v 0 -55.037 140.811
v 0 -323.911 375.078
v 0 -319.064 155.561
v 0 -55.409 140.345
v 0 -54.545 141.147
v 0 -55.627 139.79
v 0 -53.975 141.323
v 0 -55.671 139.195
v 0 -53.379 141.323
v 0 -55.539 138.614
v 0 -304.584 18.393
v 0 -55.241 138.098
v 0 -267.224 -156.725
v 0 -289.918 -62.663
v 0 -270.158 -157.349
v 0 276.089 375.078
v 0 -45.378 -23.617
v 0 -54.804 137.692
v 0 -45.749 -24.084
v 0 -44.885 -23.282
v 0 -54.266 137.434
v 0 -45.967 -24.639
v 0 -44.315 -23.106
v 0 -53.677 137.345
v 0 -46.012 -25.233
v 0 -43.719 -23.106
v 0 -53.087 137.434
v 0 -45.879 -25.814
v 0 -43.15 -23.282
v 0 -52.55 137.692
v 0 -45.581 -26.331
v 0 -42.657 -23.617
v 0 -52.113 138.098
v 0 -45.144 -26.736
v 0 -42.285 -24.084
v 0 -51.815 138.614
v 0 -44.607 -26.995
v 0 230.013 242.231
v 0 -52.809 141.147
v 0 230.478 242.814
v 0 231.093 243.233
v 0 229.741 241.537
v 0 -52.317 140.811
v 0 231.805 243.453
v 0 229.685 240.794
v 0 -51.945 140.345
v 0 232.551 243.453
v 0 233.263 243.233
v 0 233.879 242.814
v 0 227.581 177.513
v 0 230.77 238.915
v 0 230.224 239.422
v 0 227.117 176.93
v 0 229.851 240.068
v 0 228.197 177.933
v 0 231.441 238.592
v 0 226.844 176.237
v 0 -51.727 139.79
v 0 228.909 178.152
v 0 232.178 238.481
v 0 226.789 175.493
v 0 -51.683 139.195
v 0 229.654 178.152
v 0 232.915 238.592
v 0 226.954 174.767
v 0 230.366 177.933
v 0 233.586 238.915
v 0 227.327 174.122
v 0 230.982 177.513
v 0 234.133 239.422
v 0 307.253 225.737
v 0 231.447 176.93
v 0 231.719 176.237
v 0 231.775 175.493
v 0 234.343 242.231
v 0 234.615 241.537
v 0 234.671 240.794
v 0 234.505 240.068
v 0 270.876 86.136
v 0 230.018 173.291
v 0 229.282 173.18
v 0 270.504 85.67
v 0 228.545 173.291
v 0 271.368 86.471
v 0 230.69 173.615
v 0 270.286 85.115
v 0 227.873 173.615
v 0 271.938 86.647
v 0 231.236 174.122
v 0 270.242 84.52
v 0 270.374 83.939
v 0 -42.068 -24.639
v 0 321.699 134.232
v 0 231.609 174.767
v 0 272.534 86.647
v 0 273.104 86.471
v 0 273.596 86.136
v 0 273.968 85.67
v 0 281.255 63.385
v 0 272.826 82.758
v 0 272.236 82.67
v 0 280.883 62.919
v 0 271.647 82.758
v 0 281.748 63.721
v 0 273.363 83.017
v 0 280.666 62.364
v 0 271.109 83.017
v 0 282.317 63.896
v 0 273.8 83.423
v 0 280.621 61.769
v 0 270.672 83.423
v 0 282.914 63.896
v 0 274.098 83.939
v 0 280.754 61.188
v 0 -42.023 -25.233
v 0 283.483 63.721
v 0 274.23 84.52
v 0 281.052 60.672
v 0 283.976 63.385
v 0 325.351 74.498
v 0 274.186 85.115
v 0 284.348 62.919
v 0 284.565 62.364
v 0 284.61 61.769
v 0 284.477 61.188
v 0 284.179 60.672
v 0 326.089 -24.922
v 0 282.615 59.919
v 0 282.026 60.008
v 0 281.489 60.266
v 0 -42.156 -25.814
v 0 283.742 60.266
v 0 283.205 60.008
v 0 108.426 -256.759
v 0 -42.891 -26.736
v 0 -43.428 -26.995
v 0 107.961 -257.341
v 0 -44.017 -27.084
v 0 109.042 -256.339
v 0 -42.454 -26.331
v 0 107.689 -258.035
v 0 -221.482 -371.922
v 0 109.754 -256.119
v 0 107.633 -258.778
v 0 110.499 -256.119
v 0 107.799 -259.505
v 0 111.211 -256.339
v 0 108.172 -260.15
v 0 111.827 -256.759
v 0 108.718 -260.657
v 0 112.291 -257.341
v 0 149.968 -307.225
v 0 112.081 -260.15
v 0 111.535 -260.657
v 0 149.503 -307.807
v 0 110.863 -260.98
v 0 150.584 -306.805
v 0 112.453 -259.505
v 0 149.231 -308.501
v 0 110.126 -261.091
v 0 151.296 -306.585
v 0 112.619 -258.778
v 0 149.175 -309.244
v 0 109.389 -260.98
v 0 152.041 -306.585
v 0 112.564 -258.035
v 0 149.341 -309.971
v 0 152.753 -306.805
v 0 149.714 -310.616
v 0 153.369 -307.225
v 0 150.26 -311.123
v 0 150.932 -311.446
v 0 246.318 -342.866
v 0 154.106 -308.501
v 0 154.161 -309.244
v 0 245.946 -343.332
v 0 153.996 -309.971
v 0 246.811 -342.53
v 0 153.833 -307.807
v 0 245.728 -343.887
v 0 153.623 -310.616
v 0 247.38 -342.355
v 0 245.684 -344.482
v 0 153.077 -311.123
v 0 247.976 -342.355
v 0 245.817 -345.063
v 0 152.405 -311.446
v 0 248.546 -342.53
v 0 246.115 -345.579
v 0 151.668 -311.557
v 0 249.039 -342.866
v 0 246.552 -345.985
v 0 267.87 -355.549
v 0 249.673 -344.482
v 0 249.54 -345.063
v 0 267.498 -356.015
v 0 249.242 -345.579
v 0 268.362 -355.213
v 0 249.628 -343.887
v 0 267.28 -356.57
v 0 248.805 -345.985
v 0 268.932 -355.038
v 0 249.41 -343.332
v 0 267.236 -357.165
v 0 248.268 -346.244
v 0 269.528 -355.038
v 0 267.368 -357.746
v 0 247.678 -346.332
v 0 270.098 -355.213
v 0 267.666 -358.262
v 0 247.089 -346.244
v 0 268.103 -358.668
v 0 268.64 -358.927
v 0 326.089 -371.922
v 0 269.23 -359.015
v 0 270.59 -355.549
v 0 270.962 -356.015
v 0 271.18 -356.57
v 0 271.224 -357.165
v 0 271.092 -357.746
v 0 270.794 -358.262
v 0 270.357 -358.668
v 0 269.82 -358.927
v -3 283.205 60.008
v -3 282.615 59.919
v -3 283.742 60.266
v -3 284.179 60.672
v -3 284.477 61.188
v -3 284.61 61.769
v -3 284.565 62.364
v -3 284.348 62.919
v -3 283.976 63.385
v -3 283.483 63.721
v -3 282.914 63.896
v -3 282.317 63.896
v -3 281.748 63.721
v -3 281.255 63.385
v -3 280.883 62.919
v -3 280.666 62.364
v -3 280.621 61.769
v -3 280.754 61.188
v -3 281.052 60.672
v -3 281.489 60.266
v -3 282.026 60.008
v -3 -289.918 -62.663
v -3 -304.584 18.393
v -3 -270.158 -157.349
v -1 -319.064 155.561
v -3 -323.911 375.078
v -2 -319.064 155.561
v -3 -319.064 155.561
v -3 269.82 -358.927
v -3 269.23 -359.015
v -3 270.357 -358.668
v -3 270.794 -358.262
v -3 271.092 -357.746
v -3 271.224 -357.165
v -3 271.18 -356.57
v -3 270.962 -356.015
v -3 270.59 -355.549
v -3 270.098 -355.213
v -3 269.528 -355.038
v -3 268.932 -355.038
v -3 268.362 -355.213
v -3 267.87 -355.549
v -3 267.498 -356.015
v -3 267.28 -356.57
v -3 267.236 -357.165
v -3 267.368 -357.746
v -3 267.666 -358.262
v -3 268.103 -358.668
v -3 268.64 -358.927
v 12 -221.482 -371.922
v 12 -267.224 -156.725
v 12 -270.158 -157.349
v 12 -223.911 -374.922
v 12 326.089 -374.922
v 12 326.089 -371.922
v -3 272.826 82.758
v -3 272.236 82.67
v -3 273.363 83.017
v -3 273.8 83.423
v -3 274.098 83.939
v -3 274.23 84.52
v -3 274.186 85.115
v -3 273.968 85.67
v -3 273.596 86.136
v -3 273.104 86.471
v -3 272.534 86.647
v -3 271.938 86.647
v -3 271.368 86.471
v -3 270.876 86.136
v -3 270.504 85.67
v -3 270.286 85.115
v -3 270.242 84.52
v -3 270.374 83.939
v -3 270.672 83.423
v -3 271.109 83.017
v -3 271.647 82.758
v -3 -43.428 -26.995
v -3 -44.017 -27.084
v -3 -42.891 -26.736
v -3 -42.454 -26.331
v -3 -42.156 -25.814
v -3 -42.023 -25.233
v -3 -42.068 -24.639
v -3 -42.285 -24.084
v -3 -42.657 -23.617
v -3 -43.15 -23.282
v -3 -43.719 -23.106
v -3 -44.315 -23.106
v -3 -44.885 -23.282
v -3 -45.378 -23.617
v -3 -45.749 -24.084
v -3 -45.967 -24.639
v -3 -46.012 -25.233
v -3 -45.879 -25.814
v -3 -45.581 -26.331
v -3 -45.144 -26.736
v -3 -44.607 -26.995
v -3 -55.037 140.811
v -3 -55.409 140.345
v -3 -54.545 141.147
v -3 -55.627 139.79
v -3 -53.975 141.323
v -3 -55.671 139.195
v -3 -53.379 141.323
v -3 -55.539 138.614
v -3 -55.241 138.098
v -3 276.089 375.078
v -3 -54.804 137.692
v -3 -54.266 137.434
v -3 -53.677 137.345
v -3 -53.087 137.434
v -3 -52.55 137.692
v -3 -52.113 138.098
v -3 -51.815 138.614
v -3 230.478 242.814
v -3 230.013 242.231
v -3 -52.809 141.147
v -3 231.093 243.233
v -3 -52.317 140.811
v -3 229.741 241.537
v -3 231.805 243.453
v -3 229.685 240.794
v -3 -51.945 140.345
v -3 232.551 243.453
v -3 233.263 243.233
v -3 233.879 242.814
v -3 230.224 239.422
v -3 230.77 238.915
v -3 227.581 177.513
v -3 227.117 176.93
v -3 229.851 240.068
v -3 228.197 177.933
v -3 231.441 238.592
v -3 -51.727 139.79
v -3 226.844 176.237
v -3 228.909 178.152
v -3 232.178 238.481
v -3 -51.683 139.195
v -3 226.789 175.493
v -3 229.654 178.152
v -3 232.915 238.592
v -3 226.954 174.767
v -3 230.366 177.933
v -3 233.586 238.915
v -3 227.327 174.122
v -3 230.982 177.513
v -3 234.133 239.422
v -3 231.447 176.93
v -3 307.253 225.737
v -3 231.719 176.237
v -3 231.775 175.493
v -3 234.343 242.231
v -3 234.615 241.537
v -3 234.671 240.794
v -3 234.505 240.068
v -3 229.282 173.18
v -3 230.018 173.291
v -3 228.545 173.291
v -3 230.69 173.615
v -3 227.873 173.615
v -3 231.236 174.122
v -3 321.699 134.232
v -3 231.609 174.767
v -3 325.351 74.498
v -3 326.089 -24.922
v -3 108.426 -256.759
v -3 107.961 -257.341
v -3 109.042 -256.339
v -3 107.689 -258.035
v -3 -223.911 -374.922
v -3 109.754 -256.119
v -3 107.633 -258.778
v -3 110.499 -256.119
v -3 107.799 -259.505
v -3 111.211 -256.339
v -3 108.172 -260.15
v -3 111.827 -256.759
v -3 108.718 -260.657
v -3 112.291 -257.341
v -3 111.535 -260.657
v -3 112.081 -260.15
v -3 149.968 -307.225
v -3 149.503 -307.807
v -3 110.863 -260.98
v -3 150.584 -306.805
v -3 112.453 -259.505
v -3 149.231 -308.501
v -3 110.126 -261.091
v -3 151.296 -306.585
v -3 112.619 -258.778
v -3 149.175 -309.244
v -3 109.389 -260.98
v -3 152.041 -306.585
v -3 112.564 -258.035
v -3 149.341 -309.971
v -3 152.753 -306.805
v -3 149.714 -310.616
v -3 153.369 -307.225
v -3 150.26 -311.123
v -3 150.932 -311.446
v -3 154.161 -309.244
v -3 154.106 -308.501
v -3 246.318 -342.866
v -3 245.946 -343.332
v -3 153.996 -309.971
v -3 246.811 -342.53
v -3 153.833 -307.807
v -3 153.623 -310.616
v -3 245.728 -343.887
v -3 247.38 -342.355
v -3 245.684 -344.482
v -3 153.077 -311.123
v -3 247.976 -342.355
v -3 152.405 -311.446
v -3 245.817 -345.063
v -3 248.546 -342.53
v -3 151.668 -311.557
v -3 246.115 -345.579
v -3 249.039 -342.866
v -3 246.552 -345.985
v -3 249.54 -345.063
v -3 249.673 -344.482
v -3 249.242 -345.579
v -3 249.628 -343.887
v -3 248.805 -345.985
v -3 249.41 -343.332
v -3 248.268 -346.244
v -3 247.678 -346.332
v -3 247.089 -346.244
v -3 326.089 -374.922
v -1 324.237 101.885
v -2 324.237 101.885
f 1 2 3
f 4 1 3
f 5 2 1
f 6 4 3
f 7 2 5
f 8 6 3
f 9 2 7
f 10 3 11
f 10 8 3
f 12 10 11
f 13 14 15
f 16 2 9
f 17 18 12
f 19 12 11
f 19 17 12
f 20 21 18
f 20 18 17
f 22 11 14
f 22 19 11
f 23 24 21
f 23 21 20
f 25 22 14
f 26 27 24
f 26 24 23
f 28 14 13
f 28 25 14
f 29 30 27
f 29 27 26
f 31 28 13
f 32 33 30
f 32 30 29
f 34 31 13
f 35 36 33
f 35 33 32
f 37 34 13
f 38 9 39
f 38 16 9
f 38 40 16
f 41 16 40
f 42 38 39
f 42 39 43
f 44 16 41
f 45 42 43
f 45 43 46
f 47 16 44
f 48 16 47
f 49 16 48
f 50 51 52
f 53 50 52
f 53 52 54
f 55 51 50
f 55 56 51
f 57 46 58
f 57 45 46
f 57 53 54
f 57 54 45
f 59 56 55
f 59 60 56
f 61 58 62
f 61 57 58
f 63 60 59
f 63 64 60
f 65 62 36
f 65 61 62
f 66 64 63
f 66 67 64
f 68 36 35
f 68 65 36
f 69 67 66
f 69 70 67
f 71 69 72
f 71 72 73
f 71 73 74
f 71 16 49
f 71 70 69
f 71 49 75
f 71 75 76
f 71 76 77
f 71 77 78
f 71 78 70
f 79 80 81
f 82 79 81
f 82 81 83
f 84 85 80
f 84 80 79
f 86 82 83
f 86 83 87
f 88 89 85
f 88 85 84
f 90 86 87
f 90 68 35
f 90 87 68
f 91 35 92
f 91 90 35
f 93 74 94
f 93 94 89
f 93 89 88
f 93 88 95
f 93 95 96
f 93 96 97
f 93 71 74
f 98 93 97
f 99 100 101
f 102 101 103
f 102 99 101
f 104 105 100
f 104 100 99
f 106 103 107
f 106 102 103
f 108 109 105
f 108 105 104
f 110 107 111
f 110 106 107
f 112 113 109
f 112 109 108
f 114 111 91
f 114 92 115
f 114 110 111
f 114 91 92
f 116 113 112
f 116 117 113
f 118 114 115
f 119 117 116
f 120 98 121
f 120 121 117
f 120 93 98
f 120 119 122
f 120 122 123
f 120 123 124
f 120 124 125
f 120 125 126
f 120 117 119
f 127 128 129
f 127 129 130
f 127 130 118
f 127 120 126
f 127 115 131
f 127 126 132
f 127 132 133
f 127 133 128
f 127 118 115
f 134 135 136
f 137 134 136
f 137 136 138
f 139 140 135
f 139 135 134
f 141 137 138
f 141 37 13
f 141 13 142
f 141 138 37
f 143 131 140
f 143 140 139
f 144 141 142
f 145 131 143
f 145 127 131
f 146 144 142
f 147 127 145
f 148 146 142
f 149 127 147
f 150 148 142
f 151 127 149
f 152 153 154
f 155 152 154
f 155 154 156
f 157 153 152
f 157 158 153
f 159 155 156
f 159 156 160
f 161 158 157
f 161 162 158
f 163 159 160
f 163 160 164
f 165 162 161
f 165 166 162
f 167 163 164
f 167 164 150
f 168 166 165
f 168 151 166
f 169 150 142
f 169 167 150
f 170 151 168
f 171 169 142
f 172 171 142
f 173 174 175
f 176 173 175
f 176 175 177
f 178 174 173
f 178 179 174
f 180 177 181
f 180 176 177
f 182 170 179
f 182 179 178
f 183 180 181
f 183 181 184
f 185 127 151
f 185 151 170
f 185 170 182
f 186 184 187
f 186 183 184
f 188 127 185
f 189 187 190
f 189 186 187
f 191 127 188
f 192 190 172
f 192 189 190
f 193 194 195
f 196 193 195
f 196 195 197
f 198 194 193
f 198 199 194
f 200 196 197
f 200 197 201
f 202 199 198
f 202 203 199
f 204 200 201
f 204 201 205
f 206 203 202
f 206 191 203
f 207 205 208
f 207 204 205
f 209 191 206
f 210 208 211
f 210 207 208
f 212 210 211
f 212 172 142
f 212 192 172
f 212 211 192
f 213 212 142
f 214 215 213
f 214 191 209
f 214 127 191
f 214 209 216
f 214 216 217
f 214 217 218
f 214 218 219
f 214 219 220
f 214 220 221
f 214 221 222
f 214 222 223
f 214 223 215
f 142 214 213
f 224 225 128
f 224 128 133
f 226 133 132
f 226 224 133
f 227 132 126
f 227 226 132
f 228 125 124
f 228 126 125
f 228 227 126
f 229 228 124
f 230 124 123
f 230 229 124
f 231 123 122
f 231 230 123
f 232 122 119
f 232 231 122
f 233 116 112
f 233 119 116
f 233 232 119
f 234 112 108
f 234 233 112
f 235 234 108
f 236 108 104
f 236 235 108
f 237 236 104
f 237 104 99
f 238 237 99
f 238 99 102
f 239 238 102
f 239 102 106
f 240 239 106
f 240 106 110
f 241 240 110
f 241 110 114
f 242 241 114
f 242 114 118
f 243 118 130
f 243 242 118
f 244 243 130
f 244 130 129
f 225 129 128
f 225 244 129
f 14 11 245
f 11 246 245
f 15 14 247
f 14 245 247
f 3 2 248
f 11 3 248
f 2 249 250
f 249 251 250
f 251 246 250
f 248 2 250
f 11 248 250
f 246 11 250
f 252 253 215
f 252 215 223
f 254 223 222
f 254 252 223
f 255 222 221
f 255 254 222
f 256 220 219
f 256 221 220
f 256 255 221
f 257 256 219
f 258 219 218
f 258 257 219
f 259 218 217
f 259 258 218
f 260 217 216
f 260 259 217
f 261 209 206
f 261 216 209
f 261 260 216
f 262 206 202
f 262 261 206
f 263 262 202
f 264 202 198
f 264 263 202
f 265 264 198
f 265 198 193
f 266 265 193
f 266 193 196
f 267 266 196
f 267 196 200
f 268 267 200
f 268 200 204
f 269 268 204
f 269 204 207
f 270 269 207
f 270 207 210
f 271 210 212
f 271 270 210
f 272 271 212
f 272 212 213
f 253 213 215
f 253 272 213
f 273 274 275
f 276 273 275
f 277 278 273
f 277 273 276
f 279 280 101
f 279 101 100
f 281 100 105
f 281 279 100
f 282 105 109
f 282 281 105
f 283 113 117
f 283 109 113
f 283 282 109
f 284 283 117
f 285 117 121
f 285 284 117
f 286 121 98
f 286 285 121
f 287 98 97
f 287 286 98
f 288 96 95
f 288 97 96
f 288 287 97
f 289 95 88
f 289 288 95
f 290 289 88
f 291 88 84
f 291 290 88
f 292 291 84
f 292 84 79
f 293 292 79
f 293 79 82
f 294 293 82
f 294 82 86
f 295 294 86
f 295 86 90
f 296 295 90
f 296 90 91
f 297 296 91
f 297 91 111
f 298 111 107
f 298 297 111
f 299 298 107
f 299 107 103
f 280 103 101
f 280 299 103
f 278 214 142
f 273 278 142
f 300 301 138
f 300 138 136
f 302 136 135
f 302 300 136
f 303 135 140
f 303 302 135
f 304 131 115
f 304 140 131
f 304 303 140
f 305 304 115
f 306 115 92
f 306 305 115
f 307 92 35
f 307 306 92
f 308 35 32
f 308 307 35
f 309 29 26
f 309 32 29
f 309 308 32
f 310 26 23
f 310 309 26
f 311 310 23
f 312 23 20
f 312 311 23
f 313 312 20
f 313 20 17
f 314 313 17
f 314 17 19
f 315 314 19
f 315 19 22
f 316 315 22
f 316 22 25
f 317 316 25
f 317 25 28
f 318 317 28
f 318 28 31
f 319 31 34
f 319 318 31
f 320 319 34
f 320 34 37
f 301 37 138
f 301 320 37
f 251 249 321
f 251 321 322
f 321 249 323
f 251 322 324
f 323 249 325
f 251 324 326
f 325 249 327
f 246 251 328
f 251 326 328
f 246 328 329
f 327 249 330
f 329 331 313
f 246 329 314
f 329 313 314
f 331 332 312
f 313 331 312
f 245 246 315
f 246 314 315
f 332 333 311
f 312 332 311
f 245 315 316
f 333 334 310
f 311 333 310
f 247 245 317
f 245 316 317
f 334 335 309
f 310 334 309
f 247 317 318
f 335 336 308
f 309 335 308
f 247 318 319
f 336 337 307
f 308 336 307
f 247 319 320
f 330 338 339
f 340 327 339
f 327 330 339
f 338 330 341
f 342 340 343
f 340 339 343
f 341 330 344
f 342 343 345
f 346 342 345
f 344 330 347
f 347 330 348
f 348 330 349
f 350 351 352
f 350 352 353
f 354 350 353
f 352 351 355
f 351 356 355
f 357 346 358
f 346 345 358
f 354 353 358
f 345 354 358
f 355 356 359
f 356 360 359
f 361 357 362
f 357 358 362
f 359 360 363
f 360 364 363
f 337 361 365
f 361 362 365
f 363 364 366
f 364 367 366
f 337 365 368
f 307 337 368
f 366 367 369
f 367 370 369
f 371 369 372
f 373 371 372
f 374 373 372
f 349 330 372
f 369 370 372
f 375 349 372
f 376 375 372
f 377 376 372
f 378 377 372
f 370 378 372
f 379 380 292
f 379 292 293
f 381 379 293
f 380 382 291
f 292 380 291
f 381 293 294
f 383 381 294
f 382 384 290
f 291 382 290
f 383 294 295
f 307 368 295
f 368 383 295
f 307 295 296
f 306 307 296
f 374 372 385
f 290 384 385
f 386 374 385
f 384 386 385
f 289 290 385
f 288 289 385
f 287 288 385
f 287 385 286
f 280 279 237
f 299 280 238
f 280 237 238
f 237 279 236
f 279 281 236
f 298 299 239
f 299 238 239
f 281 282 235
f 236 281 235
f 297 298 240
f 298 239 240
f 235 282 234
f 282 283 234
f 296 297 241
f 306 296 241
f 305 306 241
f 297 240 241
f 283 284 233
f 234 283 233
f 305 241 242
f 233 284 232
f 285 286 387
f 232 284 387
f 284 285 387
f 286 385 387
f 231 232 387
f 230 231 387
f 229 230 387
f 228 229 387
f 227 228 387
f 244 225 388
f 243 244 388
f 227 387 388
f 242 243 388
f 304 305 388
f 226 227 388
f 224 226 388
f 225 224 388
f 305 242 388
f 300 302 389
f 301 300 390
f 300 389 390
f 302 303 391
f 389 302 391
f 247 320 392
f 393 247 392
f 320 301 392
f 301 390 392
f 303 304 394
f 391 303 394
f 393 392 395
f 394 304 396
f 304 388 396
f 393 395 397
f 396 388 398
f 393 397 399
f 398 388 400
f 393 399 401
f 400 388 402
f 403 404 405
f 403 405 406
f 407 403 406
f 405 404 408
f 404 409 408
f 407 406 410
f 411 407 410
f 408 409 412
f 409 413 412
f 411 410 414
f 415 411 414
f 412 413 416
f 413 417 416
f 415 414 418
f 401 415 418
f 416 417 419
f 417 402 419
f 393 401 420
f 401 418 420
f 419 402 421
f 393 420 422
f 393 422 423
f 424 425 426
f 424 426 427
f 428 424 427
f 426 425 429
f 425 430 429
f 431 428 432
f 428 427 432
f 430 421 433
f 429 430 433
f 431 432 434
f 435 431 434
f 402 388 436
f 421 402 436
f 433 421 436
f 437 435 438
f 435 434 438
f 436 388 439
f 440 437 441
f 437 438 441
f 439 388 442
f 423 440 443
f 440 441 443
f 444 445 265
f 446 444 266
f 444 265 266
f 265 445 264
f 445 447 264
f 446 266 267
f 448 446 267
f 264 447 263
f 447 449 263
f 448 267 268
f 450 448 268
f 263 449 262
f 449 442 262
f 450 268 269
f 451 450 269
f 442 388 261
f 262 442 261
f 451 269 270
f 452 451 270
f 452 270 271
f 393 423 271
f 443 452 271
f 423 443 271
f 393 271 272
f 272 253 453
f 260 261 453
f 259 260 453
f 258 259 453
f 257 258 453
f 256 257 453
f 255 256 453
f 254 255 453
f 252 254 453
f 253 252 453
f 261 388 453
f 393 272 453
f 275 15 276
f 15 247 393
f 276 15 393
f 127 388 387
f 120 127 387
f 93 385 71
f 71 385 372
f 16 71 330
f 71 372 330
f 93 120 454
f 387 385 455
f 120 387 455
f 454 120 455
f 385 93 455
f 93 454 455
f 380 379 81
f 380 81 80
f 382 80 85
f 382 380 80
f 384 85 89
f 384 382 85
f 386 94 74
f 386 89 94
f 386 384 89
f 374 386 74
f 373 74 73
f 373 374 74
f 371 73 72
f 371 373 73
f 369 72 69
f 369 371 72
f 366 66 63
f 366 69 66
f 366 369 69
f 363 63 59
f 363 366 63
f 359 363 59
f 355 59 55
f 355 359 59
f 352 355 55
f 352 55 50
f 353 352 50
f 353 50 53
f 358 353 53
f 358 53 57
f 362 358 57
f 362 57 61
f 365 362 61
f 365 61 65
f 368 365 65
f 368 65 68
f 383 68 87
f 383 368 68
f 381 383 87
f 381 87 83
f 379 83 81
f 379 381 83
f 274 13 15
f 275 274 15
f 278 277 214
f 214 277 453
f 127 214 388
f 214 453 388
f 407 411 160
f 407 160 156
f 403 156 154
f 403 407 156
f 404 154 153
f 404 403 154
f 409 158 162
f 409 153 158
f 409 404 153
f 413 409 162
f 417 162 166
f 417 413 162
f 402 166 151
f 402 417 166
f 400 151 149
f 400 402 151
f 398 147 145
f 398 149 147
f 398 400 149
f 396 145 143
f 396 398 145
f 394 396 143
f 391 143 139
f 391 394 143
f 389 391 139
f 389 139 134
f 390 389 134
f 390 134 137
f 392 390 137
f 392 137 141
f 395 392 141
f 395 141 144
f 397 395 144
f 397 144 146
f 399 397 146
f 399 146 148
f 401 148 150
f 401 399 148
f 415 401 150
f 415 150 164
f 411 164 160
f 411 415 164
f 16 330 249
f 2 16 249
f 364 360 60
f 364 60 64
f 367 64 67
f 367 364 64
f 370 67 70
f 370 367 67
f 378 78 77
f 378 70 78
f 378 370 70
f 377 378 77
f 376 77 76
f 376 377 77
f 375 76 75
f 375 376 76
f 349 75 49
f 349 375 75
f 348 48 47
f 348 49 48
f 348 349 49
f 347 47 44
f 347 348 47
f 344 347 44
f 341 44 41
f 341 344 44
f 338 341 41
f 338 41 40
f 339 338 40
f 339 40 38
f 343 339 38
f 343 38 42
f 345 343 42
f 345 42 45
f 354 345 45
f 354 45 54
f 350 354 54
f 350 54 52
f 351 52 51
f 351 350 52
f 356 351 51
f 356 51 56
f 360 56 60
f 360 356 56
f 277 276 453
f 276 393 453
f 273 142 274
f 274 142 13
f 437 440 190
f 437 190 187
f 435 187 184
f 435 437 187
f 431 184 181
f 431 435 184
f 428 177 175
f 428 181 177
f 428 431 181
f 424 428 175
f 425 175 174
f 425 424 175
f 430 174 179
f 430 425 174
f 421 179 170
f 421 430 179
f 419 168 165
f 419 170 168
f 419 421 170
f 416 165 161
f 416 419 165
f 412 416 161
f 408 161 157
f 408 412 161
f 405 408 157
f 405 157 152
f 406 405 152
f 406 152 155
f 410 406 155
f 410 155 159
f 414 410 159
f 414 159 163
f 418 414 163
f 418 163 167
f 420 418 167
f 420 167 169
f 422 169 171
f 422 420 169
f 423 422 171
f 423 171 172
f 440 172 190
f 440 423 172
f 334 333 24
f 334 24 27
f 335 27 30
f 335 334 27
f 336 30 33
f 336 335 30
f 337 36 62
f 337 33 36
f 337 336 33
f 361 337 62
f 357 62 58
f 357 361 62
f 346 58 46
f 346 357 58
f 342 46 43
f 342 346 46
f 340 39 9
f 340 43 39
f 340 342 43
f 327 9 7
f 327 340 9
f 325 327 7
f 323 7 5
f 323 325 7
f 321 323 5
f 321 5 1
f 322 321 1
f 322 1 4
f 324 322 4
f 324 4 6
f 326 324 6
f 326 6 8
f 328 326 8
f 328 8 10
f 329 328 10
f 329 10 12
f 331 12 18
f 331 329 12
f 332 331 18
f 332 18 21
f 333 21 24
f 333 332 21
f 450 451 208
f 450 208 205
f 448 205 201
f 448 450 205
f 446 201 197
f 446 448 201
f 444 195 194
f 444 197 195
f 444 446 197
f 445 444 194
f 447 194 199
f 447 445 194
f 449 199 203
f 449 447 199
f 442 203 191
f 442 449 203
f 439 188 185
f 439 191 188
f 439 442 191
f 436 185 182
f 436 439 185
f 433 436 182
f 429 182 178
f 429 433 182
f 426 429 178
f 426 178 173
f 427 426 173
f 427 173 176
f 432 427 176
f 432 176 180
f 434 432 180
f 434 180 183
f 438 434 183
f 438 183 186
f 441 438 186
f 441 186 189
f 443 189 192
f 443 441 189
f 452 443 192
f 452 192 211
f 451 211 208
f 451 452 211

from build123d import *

# Parameters (mm, degrees)
BOSS_EXTRUDE1_START     = -3
BOSS_EXTRUDE1_DEPTH     = 3
BOSS_EXTRUDE2_DEPTH     = 12
CUT_EXTRUDE1_DEPTH      = 498.153256686
CUT_EXTRUDE1_DEPTH_BACK = 498.153256686
SKETCH4_R               = 2
SKETCH4_R_2             = 2.5


# Read off the part's stored shape, not the designer's step: Boss-Extrude1
with BuildPart() as part:
    # Boss-Extrude1 outline → Boss-Extrude1 (new body)
    with BuildSketch(Plane(origin=(0, 0, 0), x_dir=(0, 0, -1), z_dir=(1, 0, 0)).offset(BOSS_EXTRUDE1_START)):
        with BuildLine():
            Line((374.921925096, 326.088635526), (24.921925096, 326.088635526))
            add(Edge.make_bspline(
                [(24.921925096, 326.088635526), (-144.675070379, 326.088635526), (-139.84656943, 326.088635526), (-375.078074904, 276.088635526)],
                knots=[0, 0, 0, 0, 1, 1, 1, 1], degree=3))
            Line((-375.078074904, 276.088635526), (-375.078074904, -323.911364474))
            add(Edge.make_bspline(
                [(-375.078074904, -323.911364474), (-95.541085852, -323.911364474), (-35.062480537, -311.056240074), (157.348776273, -270.157964899)],
                knots=[0, 0, 0, 0, 1, 1, 1, 1], degree=3))
            Line((157.348776273, -270.157964899), (374.921925096, -223.911364474))
            Line((374.921925096, -223.911364474), (374.921925096, 326.088635526))
        make_face()
    extrude(amount=BOSS_EXTRUDE1_DEPTH)

    # Sketch3 → Boss-Extrude2 (add)
    with BuildSketch(Plane(origin=(0, 0, 0), x_dir=(0, 0, -1), z_dir=(1, 0, 0))):
        Polygon((157.348776273, -270.157964899), (374.921925096, -223.911364474), (374.921925096, 326.088635526), (371.921925096, 326.088635526), (371.921925096, -221.482012374), (156.725041201, -267.223522097), align=None)
    extrude(amount=BOSS_EXTRUDE2_DEPTH)

    # Sketch4 → Cut-Extrude1 (cut, two sides: drawn at the far end of the back side and taken through both)
    with BuildSketch(Plane(origin=(0, 0, 0), x_dir=(0, 0, -1), z_dir=(1, 0, 0)).offset(-CUT_EXTRUDE1_DEPTH_BACK)):
        with Locations((25.083553444, -44.01739539)):
            Circle(SKETCH4_R)
        with Locations((357.01536917, 269.230000887)):
            Circle(SKETCH4_R)
        with Locations((344.332369965, 247.678292183)):
            Circle(SKETCH4_R)
        with Locations((309.057260956, 151.668432327)):
            Circle(SKETCH4_R_2)
        with Locations((258.591204121, 110.126241652)):
            Circle(SKETCH4_R_2)
        with Locations((-61.91870145, 282.615467423)):
            Circle(SKETCH4_R)
        with Locations((-84.669558452, 272.236010663)):
            Circle(SKETCH4_R)
        with Locations((-175.680236141, 229.281564523)):
            Circle(SKETCH4_R_2)
        with Locations((-240.980976375, 232.178083695)):
            Circle(SKETCH4_R_2)
        with Locations((-139.344950951, -53.676954932)):
            Circle(SKETCH4_R)
    extrude(amount=CUT_EXTRUDE1_DEPTH + CUT_EXTRUDE1_DEPTH_BACK, mode=Mode.SUBTRACT)


solid = part.part
